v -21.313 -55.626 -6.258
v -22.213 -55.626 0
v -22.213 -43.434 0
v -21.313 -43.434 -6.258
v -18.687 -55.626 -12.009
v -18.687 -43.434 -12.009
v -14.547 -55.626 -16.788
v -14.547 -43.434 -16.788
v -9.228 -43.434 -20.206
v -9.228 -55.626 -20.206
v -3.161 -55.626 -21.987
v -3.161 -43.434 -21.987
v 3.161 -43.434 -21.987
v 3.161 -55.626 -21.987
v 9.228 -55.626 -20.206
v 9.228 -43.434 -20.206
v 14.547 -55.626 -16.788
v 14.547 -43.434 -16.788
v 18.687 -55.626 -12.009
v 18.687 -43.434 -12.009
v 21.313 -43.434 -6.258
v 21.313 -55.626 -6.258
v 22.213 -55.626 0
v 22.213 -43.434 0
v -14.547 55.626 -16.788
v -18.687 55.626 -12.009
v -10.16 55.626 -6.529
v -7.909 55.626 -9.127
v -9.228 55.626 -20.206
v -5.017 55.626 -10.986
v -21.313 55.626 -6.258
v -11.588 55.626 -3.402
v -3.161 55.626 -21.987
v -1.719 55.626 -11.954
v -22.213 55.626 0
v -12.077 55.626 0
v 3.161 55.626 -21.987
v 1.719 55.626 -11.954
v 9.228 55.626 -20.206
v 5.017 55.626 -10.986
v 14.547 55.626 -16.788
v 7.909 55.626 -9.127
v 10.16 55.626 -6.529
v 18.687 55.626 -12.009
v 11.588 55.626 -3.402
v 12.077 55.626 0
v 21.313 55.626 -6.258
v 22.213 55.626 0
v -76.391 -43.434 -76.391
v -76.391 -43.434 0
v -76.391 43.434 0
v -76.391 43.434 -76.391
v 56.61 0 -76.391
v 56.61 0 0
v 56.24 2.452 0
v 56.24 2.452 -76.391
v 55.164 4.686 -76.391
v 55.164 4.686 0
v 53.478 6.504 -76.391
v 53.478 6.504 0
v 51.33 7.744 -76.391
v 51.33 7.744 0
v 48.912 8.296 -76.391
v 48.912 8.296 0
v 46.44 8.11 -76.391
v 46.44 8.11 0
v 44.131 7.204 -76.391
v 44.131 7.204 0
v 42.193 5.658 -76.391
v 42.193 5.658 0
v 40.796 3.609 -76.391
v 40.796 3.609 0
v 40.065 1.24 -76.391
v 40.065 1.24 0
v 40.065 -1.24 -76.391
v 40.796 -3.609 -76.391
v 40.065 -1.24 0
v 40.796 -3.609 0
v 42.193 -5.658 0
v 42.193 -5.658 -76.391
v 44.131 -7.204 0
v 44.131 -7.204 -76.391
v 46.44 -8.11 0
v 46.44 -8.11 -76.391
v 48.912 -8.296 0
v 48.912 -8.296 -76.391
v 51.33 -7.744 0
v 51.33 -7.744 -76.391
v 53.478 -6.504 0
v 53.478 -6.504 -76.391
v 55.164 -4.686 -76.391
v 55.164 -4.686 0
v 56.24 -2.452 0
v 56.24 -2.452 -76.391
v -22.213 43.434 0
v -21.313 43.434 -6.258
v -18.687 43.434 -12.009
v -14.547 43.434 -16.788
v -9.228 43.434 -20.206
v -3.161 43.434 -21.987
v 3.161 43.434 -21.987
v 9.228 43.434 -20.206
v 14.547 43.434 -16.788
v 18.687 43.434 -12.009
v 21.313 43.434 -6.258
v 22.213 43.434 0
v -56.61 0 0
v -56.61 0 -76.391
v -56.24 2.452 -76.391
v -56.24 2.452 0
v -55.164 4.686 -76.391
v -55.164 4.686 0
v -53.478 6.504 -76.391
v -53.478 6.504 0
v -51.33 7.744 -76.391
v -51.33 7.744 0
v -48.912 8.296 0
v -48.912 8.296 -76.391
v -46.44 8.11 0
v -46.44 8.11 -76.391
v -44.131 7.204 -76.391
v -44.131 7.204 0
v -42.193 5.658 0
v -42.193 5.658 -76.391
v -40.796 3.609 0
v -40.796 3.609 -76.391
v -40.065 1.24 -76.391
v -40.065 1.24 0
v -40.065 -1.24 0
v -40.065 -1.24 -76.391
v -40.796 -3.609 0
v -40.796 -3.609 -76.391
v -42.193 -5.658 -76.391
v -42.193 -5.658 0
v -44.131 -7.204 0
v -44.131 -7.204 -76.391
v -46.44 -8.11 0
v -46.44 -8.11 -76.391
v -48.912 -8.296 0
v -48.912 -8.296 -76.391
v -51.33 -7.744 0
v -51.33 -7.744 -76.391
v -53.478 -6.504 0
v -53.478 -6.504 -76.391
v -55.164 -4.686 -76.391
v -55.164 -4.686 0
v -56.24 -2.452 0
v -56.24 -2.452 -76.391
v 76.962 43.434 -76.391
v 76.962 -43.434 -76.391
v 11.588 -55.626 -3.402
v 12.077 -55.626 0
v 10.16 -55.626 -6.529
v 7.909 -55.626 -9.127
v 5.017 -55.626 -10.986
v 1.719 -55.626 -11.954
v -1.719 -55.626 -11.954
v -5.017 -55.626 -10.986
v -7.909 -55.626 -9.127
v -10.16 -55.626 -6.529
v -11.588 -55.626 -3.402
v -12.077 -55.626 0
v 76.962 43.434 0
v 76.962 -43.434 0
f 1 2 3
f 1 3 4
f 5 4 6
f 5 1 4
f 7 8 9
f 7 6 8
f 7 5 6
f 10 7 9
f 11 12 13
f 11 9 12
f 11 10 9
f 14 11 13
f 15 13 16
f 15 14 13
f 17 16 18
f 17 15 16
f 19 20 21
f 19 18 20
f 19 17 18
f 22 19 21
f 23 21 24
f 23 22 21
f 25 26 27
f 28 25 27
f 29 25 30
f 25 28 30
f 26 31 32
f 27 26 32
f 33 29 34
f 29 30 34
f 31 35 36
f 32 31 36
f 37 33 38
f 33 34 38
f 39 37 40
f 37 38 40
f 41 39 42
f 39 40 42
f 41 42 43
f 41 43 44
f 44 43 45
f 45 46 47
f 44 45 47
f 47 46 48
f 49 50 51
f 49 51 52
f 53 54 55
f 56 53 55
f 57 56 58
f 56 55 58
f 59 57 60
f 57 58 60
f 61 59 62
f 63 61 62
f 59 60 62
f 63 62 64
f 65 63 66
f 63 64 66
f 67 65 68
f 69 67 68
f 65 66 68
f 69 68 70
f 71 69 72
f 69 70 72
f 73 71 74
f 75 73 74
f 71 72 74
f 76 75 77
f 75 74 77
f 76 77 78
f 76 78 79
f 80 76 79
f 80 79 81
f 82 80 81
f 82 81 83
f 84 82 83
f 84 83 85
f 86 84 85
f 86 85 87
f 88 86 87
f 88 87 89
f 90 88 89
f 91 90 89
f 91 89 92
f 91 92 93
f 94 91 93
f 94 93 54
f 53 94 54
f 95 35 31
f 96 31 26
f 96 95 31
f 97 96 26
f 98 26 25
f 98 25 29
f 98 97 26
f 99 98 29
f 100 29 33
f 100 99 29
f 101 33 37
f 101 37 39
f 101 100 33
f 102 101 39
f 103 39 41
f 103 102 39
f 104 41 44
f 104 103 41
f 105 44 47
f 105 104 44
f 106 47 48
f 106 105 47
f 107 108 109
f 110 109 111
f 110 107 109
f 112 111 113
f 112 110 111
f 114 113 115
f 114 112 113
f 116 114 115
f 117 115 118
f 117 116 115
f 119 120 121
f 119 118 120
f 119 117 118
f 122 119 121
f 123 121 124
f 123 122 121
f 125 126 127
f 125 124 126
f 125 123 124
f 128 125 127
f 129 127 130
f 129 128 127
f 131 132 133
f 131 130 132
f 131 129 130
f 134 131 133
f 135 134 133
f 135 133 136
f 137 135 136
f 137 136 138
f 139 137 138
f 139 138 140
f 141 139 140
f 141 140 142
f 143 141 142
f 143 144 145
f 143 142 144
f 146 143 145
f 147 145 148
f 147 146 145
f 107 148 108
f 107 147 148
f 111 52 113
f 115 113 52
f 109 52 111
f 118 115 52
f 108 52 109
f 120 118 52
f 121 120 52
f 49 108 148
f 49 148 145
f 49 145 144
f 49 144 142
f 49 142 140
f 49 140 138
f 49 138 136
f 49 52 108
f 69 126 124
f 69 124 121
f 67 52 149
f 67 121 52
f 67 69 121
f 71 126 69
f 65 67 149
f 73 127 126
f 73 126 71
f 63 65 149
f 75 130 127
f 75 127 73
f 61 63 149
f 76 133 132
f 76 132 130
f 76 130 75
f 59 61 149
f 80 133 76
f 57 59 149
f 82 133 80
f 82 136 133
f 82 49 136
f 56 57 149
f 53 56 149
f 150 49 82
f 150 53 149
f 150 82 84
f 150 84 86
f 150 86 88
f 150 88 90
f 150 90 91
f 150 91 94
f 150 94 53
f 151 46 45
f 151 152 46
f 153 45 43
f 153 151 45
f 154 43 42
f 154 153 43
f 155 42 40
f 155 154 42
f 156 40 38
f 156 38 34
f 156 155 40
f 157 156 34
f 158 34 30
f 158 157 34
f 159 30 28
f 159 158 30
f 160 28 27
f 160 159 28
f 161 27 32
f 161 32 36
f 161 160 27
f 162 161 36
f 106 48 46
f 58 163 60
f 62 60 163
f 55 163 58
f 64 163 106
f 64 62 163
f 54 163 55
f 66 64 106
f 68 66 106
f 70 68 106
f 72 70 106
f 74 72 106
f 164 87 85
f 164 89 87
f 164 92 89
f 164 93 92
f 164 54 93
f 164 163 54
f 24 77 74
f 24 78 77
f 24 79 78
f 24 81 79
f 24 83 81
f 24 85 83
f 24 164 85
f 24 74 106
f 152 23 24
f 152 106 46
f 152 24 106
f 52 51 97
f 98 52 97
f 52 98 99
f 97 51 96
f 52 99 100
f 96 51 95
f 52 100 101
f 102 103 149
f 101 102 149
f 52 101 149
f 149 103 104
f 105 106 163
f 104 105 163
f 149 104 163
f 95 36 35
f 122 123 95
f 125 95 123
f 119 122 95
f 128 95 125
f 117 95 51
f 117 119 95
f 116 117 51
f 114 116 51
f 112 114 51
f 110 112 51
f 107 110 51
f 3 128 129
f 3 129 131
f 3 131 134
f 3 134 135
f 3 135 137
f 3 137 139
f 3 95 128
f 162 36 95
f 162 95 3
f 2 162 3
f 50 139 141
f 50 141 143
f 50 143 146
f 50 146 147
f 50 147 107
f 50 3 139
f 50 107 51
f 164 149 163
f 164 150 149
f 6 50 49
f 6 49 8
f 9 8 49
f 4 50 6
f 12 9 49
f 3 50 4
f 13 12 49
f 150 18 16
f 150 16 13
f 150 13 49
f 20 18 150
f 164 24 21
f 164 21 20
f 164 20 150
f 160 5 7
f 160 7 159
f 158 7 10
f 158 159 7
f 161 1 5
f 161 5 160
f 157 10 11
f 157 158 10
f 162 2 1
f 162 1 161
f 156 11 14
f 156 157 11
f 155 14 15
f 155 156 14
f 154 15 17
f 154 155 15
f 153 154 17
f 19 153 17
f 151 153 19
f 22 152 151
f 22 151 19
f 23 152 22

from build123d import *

# Parameters (mm, degrees)
F1_DEPTH = 43.434
F2_DEPTH = 55.626
F3_R     = 8.3189115378
F4_DEPTH = 76.3916911016


# Not quite as in the source:
# - a pattern or mirror of a feature is missing from the dataset's text; its kind, count and spacing are read off the source's solid


with BuildPart() as f1:
    # F0 (on Front) → F1 (new body, symmetric)
    with BuildSketch(Plane.XZ):
        with BuildLine():
            ThreePointArc((22.2132560443, 0), (0, -22.2132560443), (-22.2132560443, 0))
            Line((-22.2132560443, 0), (-76.3906985521, 0))
            Line((-76.3906985521, 0), (-76.3906985521, -76.3906911016))
            Line((-76.3906985521, -76.3906911016), (76.9618302584, -76.3906911016))
            Line((76.9618302584, -76.3906911016), (76.9618302584, 0))
            Line((76.9618302584, 0), (22.2132560443, 0))
        make_face()
    extrude(amount=F1_DEPTH, both=True)

    # F0 (on Front) → F2 (join, symmetric)
    with BuildSketch(Plane.XZ):
        with BuildLine():
            ThreePointArc((12.0770555024, 0), (0, -12.0770555024), (-12.0770555024, 0))
            Line((-12.0770555024, 0), (-22.2132560443, 0))
            ThreePointArc((-22.2132560443, 0), (0, -22.2132560443), (22.2132560443, 0))
            Line((22.2132560443, 0), (12.0770555024, 0))
        make_face()
    extrude(amount=F2_DEPTH, both=True)

    # F3 (on face) → F4 (cut, through all)
    with BuildSketch(Plane.XY):
        with Locations((48.2908003032, 0)):
            Circle(F3_R)
    f4 = extrude(amount=-F4_DEPTH, mode=Mode.SUBTRACT)

    # F4_copies: F4 across plane
    add(f4.mirror(Plane(origin=(0, 0, 0), x_dir=(0, 0, -1), z_dir=(-1, 0, 0))), mode=Mode.SUBTRACT)


solid = f1.part
